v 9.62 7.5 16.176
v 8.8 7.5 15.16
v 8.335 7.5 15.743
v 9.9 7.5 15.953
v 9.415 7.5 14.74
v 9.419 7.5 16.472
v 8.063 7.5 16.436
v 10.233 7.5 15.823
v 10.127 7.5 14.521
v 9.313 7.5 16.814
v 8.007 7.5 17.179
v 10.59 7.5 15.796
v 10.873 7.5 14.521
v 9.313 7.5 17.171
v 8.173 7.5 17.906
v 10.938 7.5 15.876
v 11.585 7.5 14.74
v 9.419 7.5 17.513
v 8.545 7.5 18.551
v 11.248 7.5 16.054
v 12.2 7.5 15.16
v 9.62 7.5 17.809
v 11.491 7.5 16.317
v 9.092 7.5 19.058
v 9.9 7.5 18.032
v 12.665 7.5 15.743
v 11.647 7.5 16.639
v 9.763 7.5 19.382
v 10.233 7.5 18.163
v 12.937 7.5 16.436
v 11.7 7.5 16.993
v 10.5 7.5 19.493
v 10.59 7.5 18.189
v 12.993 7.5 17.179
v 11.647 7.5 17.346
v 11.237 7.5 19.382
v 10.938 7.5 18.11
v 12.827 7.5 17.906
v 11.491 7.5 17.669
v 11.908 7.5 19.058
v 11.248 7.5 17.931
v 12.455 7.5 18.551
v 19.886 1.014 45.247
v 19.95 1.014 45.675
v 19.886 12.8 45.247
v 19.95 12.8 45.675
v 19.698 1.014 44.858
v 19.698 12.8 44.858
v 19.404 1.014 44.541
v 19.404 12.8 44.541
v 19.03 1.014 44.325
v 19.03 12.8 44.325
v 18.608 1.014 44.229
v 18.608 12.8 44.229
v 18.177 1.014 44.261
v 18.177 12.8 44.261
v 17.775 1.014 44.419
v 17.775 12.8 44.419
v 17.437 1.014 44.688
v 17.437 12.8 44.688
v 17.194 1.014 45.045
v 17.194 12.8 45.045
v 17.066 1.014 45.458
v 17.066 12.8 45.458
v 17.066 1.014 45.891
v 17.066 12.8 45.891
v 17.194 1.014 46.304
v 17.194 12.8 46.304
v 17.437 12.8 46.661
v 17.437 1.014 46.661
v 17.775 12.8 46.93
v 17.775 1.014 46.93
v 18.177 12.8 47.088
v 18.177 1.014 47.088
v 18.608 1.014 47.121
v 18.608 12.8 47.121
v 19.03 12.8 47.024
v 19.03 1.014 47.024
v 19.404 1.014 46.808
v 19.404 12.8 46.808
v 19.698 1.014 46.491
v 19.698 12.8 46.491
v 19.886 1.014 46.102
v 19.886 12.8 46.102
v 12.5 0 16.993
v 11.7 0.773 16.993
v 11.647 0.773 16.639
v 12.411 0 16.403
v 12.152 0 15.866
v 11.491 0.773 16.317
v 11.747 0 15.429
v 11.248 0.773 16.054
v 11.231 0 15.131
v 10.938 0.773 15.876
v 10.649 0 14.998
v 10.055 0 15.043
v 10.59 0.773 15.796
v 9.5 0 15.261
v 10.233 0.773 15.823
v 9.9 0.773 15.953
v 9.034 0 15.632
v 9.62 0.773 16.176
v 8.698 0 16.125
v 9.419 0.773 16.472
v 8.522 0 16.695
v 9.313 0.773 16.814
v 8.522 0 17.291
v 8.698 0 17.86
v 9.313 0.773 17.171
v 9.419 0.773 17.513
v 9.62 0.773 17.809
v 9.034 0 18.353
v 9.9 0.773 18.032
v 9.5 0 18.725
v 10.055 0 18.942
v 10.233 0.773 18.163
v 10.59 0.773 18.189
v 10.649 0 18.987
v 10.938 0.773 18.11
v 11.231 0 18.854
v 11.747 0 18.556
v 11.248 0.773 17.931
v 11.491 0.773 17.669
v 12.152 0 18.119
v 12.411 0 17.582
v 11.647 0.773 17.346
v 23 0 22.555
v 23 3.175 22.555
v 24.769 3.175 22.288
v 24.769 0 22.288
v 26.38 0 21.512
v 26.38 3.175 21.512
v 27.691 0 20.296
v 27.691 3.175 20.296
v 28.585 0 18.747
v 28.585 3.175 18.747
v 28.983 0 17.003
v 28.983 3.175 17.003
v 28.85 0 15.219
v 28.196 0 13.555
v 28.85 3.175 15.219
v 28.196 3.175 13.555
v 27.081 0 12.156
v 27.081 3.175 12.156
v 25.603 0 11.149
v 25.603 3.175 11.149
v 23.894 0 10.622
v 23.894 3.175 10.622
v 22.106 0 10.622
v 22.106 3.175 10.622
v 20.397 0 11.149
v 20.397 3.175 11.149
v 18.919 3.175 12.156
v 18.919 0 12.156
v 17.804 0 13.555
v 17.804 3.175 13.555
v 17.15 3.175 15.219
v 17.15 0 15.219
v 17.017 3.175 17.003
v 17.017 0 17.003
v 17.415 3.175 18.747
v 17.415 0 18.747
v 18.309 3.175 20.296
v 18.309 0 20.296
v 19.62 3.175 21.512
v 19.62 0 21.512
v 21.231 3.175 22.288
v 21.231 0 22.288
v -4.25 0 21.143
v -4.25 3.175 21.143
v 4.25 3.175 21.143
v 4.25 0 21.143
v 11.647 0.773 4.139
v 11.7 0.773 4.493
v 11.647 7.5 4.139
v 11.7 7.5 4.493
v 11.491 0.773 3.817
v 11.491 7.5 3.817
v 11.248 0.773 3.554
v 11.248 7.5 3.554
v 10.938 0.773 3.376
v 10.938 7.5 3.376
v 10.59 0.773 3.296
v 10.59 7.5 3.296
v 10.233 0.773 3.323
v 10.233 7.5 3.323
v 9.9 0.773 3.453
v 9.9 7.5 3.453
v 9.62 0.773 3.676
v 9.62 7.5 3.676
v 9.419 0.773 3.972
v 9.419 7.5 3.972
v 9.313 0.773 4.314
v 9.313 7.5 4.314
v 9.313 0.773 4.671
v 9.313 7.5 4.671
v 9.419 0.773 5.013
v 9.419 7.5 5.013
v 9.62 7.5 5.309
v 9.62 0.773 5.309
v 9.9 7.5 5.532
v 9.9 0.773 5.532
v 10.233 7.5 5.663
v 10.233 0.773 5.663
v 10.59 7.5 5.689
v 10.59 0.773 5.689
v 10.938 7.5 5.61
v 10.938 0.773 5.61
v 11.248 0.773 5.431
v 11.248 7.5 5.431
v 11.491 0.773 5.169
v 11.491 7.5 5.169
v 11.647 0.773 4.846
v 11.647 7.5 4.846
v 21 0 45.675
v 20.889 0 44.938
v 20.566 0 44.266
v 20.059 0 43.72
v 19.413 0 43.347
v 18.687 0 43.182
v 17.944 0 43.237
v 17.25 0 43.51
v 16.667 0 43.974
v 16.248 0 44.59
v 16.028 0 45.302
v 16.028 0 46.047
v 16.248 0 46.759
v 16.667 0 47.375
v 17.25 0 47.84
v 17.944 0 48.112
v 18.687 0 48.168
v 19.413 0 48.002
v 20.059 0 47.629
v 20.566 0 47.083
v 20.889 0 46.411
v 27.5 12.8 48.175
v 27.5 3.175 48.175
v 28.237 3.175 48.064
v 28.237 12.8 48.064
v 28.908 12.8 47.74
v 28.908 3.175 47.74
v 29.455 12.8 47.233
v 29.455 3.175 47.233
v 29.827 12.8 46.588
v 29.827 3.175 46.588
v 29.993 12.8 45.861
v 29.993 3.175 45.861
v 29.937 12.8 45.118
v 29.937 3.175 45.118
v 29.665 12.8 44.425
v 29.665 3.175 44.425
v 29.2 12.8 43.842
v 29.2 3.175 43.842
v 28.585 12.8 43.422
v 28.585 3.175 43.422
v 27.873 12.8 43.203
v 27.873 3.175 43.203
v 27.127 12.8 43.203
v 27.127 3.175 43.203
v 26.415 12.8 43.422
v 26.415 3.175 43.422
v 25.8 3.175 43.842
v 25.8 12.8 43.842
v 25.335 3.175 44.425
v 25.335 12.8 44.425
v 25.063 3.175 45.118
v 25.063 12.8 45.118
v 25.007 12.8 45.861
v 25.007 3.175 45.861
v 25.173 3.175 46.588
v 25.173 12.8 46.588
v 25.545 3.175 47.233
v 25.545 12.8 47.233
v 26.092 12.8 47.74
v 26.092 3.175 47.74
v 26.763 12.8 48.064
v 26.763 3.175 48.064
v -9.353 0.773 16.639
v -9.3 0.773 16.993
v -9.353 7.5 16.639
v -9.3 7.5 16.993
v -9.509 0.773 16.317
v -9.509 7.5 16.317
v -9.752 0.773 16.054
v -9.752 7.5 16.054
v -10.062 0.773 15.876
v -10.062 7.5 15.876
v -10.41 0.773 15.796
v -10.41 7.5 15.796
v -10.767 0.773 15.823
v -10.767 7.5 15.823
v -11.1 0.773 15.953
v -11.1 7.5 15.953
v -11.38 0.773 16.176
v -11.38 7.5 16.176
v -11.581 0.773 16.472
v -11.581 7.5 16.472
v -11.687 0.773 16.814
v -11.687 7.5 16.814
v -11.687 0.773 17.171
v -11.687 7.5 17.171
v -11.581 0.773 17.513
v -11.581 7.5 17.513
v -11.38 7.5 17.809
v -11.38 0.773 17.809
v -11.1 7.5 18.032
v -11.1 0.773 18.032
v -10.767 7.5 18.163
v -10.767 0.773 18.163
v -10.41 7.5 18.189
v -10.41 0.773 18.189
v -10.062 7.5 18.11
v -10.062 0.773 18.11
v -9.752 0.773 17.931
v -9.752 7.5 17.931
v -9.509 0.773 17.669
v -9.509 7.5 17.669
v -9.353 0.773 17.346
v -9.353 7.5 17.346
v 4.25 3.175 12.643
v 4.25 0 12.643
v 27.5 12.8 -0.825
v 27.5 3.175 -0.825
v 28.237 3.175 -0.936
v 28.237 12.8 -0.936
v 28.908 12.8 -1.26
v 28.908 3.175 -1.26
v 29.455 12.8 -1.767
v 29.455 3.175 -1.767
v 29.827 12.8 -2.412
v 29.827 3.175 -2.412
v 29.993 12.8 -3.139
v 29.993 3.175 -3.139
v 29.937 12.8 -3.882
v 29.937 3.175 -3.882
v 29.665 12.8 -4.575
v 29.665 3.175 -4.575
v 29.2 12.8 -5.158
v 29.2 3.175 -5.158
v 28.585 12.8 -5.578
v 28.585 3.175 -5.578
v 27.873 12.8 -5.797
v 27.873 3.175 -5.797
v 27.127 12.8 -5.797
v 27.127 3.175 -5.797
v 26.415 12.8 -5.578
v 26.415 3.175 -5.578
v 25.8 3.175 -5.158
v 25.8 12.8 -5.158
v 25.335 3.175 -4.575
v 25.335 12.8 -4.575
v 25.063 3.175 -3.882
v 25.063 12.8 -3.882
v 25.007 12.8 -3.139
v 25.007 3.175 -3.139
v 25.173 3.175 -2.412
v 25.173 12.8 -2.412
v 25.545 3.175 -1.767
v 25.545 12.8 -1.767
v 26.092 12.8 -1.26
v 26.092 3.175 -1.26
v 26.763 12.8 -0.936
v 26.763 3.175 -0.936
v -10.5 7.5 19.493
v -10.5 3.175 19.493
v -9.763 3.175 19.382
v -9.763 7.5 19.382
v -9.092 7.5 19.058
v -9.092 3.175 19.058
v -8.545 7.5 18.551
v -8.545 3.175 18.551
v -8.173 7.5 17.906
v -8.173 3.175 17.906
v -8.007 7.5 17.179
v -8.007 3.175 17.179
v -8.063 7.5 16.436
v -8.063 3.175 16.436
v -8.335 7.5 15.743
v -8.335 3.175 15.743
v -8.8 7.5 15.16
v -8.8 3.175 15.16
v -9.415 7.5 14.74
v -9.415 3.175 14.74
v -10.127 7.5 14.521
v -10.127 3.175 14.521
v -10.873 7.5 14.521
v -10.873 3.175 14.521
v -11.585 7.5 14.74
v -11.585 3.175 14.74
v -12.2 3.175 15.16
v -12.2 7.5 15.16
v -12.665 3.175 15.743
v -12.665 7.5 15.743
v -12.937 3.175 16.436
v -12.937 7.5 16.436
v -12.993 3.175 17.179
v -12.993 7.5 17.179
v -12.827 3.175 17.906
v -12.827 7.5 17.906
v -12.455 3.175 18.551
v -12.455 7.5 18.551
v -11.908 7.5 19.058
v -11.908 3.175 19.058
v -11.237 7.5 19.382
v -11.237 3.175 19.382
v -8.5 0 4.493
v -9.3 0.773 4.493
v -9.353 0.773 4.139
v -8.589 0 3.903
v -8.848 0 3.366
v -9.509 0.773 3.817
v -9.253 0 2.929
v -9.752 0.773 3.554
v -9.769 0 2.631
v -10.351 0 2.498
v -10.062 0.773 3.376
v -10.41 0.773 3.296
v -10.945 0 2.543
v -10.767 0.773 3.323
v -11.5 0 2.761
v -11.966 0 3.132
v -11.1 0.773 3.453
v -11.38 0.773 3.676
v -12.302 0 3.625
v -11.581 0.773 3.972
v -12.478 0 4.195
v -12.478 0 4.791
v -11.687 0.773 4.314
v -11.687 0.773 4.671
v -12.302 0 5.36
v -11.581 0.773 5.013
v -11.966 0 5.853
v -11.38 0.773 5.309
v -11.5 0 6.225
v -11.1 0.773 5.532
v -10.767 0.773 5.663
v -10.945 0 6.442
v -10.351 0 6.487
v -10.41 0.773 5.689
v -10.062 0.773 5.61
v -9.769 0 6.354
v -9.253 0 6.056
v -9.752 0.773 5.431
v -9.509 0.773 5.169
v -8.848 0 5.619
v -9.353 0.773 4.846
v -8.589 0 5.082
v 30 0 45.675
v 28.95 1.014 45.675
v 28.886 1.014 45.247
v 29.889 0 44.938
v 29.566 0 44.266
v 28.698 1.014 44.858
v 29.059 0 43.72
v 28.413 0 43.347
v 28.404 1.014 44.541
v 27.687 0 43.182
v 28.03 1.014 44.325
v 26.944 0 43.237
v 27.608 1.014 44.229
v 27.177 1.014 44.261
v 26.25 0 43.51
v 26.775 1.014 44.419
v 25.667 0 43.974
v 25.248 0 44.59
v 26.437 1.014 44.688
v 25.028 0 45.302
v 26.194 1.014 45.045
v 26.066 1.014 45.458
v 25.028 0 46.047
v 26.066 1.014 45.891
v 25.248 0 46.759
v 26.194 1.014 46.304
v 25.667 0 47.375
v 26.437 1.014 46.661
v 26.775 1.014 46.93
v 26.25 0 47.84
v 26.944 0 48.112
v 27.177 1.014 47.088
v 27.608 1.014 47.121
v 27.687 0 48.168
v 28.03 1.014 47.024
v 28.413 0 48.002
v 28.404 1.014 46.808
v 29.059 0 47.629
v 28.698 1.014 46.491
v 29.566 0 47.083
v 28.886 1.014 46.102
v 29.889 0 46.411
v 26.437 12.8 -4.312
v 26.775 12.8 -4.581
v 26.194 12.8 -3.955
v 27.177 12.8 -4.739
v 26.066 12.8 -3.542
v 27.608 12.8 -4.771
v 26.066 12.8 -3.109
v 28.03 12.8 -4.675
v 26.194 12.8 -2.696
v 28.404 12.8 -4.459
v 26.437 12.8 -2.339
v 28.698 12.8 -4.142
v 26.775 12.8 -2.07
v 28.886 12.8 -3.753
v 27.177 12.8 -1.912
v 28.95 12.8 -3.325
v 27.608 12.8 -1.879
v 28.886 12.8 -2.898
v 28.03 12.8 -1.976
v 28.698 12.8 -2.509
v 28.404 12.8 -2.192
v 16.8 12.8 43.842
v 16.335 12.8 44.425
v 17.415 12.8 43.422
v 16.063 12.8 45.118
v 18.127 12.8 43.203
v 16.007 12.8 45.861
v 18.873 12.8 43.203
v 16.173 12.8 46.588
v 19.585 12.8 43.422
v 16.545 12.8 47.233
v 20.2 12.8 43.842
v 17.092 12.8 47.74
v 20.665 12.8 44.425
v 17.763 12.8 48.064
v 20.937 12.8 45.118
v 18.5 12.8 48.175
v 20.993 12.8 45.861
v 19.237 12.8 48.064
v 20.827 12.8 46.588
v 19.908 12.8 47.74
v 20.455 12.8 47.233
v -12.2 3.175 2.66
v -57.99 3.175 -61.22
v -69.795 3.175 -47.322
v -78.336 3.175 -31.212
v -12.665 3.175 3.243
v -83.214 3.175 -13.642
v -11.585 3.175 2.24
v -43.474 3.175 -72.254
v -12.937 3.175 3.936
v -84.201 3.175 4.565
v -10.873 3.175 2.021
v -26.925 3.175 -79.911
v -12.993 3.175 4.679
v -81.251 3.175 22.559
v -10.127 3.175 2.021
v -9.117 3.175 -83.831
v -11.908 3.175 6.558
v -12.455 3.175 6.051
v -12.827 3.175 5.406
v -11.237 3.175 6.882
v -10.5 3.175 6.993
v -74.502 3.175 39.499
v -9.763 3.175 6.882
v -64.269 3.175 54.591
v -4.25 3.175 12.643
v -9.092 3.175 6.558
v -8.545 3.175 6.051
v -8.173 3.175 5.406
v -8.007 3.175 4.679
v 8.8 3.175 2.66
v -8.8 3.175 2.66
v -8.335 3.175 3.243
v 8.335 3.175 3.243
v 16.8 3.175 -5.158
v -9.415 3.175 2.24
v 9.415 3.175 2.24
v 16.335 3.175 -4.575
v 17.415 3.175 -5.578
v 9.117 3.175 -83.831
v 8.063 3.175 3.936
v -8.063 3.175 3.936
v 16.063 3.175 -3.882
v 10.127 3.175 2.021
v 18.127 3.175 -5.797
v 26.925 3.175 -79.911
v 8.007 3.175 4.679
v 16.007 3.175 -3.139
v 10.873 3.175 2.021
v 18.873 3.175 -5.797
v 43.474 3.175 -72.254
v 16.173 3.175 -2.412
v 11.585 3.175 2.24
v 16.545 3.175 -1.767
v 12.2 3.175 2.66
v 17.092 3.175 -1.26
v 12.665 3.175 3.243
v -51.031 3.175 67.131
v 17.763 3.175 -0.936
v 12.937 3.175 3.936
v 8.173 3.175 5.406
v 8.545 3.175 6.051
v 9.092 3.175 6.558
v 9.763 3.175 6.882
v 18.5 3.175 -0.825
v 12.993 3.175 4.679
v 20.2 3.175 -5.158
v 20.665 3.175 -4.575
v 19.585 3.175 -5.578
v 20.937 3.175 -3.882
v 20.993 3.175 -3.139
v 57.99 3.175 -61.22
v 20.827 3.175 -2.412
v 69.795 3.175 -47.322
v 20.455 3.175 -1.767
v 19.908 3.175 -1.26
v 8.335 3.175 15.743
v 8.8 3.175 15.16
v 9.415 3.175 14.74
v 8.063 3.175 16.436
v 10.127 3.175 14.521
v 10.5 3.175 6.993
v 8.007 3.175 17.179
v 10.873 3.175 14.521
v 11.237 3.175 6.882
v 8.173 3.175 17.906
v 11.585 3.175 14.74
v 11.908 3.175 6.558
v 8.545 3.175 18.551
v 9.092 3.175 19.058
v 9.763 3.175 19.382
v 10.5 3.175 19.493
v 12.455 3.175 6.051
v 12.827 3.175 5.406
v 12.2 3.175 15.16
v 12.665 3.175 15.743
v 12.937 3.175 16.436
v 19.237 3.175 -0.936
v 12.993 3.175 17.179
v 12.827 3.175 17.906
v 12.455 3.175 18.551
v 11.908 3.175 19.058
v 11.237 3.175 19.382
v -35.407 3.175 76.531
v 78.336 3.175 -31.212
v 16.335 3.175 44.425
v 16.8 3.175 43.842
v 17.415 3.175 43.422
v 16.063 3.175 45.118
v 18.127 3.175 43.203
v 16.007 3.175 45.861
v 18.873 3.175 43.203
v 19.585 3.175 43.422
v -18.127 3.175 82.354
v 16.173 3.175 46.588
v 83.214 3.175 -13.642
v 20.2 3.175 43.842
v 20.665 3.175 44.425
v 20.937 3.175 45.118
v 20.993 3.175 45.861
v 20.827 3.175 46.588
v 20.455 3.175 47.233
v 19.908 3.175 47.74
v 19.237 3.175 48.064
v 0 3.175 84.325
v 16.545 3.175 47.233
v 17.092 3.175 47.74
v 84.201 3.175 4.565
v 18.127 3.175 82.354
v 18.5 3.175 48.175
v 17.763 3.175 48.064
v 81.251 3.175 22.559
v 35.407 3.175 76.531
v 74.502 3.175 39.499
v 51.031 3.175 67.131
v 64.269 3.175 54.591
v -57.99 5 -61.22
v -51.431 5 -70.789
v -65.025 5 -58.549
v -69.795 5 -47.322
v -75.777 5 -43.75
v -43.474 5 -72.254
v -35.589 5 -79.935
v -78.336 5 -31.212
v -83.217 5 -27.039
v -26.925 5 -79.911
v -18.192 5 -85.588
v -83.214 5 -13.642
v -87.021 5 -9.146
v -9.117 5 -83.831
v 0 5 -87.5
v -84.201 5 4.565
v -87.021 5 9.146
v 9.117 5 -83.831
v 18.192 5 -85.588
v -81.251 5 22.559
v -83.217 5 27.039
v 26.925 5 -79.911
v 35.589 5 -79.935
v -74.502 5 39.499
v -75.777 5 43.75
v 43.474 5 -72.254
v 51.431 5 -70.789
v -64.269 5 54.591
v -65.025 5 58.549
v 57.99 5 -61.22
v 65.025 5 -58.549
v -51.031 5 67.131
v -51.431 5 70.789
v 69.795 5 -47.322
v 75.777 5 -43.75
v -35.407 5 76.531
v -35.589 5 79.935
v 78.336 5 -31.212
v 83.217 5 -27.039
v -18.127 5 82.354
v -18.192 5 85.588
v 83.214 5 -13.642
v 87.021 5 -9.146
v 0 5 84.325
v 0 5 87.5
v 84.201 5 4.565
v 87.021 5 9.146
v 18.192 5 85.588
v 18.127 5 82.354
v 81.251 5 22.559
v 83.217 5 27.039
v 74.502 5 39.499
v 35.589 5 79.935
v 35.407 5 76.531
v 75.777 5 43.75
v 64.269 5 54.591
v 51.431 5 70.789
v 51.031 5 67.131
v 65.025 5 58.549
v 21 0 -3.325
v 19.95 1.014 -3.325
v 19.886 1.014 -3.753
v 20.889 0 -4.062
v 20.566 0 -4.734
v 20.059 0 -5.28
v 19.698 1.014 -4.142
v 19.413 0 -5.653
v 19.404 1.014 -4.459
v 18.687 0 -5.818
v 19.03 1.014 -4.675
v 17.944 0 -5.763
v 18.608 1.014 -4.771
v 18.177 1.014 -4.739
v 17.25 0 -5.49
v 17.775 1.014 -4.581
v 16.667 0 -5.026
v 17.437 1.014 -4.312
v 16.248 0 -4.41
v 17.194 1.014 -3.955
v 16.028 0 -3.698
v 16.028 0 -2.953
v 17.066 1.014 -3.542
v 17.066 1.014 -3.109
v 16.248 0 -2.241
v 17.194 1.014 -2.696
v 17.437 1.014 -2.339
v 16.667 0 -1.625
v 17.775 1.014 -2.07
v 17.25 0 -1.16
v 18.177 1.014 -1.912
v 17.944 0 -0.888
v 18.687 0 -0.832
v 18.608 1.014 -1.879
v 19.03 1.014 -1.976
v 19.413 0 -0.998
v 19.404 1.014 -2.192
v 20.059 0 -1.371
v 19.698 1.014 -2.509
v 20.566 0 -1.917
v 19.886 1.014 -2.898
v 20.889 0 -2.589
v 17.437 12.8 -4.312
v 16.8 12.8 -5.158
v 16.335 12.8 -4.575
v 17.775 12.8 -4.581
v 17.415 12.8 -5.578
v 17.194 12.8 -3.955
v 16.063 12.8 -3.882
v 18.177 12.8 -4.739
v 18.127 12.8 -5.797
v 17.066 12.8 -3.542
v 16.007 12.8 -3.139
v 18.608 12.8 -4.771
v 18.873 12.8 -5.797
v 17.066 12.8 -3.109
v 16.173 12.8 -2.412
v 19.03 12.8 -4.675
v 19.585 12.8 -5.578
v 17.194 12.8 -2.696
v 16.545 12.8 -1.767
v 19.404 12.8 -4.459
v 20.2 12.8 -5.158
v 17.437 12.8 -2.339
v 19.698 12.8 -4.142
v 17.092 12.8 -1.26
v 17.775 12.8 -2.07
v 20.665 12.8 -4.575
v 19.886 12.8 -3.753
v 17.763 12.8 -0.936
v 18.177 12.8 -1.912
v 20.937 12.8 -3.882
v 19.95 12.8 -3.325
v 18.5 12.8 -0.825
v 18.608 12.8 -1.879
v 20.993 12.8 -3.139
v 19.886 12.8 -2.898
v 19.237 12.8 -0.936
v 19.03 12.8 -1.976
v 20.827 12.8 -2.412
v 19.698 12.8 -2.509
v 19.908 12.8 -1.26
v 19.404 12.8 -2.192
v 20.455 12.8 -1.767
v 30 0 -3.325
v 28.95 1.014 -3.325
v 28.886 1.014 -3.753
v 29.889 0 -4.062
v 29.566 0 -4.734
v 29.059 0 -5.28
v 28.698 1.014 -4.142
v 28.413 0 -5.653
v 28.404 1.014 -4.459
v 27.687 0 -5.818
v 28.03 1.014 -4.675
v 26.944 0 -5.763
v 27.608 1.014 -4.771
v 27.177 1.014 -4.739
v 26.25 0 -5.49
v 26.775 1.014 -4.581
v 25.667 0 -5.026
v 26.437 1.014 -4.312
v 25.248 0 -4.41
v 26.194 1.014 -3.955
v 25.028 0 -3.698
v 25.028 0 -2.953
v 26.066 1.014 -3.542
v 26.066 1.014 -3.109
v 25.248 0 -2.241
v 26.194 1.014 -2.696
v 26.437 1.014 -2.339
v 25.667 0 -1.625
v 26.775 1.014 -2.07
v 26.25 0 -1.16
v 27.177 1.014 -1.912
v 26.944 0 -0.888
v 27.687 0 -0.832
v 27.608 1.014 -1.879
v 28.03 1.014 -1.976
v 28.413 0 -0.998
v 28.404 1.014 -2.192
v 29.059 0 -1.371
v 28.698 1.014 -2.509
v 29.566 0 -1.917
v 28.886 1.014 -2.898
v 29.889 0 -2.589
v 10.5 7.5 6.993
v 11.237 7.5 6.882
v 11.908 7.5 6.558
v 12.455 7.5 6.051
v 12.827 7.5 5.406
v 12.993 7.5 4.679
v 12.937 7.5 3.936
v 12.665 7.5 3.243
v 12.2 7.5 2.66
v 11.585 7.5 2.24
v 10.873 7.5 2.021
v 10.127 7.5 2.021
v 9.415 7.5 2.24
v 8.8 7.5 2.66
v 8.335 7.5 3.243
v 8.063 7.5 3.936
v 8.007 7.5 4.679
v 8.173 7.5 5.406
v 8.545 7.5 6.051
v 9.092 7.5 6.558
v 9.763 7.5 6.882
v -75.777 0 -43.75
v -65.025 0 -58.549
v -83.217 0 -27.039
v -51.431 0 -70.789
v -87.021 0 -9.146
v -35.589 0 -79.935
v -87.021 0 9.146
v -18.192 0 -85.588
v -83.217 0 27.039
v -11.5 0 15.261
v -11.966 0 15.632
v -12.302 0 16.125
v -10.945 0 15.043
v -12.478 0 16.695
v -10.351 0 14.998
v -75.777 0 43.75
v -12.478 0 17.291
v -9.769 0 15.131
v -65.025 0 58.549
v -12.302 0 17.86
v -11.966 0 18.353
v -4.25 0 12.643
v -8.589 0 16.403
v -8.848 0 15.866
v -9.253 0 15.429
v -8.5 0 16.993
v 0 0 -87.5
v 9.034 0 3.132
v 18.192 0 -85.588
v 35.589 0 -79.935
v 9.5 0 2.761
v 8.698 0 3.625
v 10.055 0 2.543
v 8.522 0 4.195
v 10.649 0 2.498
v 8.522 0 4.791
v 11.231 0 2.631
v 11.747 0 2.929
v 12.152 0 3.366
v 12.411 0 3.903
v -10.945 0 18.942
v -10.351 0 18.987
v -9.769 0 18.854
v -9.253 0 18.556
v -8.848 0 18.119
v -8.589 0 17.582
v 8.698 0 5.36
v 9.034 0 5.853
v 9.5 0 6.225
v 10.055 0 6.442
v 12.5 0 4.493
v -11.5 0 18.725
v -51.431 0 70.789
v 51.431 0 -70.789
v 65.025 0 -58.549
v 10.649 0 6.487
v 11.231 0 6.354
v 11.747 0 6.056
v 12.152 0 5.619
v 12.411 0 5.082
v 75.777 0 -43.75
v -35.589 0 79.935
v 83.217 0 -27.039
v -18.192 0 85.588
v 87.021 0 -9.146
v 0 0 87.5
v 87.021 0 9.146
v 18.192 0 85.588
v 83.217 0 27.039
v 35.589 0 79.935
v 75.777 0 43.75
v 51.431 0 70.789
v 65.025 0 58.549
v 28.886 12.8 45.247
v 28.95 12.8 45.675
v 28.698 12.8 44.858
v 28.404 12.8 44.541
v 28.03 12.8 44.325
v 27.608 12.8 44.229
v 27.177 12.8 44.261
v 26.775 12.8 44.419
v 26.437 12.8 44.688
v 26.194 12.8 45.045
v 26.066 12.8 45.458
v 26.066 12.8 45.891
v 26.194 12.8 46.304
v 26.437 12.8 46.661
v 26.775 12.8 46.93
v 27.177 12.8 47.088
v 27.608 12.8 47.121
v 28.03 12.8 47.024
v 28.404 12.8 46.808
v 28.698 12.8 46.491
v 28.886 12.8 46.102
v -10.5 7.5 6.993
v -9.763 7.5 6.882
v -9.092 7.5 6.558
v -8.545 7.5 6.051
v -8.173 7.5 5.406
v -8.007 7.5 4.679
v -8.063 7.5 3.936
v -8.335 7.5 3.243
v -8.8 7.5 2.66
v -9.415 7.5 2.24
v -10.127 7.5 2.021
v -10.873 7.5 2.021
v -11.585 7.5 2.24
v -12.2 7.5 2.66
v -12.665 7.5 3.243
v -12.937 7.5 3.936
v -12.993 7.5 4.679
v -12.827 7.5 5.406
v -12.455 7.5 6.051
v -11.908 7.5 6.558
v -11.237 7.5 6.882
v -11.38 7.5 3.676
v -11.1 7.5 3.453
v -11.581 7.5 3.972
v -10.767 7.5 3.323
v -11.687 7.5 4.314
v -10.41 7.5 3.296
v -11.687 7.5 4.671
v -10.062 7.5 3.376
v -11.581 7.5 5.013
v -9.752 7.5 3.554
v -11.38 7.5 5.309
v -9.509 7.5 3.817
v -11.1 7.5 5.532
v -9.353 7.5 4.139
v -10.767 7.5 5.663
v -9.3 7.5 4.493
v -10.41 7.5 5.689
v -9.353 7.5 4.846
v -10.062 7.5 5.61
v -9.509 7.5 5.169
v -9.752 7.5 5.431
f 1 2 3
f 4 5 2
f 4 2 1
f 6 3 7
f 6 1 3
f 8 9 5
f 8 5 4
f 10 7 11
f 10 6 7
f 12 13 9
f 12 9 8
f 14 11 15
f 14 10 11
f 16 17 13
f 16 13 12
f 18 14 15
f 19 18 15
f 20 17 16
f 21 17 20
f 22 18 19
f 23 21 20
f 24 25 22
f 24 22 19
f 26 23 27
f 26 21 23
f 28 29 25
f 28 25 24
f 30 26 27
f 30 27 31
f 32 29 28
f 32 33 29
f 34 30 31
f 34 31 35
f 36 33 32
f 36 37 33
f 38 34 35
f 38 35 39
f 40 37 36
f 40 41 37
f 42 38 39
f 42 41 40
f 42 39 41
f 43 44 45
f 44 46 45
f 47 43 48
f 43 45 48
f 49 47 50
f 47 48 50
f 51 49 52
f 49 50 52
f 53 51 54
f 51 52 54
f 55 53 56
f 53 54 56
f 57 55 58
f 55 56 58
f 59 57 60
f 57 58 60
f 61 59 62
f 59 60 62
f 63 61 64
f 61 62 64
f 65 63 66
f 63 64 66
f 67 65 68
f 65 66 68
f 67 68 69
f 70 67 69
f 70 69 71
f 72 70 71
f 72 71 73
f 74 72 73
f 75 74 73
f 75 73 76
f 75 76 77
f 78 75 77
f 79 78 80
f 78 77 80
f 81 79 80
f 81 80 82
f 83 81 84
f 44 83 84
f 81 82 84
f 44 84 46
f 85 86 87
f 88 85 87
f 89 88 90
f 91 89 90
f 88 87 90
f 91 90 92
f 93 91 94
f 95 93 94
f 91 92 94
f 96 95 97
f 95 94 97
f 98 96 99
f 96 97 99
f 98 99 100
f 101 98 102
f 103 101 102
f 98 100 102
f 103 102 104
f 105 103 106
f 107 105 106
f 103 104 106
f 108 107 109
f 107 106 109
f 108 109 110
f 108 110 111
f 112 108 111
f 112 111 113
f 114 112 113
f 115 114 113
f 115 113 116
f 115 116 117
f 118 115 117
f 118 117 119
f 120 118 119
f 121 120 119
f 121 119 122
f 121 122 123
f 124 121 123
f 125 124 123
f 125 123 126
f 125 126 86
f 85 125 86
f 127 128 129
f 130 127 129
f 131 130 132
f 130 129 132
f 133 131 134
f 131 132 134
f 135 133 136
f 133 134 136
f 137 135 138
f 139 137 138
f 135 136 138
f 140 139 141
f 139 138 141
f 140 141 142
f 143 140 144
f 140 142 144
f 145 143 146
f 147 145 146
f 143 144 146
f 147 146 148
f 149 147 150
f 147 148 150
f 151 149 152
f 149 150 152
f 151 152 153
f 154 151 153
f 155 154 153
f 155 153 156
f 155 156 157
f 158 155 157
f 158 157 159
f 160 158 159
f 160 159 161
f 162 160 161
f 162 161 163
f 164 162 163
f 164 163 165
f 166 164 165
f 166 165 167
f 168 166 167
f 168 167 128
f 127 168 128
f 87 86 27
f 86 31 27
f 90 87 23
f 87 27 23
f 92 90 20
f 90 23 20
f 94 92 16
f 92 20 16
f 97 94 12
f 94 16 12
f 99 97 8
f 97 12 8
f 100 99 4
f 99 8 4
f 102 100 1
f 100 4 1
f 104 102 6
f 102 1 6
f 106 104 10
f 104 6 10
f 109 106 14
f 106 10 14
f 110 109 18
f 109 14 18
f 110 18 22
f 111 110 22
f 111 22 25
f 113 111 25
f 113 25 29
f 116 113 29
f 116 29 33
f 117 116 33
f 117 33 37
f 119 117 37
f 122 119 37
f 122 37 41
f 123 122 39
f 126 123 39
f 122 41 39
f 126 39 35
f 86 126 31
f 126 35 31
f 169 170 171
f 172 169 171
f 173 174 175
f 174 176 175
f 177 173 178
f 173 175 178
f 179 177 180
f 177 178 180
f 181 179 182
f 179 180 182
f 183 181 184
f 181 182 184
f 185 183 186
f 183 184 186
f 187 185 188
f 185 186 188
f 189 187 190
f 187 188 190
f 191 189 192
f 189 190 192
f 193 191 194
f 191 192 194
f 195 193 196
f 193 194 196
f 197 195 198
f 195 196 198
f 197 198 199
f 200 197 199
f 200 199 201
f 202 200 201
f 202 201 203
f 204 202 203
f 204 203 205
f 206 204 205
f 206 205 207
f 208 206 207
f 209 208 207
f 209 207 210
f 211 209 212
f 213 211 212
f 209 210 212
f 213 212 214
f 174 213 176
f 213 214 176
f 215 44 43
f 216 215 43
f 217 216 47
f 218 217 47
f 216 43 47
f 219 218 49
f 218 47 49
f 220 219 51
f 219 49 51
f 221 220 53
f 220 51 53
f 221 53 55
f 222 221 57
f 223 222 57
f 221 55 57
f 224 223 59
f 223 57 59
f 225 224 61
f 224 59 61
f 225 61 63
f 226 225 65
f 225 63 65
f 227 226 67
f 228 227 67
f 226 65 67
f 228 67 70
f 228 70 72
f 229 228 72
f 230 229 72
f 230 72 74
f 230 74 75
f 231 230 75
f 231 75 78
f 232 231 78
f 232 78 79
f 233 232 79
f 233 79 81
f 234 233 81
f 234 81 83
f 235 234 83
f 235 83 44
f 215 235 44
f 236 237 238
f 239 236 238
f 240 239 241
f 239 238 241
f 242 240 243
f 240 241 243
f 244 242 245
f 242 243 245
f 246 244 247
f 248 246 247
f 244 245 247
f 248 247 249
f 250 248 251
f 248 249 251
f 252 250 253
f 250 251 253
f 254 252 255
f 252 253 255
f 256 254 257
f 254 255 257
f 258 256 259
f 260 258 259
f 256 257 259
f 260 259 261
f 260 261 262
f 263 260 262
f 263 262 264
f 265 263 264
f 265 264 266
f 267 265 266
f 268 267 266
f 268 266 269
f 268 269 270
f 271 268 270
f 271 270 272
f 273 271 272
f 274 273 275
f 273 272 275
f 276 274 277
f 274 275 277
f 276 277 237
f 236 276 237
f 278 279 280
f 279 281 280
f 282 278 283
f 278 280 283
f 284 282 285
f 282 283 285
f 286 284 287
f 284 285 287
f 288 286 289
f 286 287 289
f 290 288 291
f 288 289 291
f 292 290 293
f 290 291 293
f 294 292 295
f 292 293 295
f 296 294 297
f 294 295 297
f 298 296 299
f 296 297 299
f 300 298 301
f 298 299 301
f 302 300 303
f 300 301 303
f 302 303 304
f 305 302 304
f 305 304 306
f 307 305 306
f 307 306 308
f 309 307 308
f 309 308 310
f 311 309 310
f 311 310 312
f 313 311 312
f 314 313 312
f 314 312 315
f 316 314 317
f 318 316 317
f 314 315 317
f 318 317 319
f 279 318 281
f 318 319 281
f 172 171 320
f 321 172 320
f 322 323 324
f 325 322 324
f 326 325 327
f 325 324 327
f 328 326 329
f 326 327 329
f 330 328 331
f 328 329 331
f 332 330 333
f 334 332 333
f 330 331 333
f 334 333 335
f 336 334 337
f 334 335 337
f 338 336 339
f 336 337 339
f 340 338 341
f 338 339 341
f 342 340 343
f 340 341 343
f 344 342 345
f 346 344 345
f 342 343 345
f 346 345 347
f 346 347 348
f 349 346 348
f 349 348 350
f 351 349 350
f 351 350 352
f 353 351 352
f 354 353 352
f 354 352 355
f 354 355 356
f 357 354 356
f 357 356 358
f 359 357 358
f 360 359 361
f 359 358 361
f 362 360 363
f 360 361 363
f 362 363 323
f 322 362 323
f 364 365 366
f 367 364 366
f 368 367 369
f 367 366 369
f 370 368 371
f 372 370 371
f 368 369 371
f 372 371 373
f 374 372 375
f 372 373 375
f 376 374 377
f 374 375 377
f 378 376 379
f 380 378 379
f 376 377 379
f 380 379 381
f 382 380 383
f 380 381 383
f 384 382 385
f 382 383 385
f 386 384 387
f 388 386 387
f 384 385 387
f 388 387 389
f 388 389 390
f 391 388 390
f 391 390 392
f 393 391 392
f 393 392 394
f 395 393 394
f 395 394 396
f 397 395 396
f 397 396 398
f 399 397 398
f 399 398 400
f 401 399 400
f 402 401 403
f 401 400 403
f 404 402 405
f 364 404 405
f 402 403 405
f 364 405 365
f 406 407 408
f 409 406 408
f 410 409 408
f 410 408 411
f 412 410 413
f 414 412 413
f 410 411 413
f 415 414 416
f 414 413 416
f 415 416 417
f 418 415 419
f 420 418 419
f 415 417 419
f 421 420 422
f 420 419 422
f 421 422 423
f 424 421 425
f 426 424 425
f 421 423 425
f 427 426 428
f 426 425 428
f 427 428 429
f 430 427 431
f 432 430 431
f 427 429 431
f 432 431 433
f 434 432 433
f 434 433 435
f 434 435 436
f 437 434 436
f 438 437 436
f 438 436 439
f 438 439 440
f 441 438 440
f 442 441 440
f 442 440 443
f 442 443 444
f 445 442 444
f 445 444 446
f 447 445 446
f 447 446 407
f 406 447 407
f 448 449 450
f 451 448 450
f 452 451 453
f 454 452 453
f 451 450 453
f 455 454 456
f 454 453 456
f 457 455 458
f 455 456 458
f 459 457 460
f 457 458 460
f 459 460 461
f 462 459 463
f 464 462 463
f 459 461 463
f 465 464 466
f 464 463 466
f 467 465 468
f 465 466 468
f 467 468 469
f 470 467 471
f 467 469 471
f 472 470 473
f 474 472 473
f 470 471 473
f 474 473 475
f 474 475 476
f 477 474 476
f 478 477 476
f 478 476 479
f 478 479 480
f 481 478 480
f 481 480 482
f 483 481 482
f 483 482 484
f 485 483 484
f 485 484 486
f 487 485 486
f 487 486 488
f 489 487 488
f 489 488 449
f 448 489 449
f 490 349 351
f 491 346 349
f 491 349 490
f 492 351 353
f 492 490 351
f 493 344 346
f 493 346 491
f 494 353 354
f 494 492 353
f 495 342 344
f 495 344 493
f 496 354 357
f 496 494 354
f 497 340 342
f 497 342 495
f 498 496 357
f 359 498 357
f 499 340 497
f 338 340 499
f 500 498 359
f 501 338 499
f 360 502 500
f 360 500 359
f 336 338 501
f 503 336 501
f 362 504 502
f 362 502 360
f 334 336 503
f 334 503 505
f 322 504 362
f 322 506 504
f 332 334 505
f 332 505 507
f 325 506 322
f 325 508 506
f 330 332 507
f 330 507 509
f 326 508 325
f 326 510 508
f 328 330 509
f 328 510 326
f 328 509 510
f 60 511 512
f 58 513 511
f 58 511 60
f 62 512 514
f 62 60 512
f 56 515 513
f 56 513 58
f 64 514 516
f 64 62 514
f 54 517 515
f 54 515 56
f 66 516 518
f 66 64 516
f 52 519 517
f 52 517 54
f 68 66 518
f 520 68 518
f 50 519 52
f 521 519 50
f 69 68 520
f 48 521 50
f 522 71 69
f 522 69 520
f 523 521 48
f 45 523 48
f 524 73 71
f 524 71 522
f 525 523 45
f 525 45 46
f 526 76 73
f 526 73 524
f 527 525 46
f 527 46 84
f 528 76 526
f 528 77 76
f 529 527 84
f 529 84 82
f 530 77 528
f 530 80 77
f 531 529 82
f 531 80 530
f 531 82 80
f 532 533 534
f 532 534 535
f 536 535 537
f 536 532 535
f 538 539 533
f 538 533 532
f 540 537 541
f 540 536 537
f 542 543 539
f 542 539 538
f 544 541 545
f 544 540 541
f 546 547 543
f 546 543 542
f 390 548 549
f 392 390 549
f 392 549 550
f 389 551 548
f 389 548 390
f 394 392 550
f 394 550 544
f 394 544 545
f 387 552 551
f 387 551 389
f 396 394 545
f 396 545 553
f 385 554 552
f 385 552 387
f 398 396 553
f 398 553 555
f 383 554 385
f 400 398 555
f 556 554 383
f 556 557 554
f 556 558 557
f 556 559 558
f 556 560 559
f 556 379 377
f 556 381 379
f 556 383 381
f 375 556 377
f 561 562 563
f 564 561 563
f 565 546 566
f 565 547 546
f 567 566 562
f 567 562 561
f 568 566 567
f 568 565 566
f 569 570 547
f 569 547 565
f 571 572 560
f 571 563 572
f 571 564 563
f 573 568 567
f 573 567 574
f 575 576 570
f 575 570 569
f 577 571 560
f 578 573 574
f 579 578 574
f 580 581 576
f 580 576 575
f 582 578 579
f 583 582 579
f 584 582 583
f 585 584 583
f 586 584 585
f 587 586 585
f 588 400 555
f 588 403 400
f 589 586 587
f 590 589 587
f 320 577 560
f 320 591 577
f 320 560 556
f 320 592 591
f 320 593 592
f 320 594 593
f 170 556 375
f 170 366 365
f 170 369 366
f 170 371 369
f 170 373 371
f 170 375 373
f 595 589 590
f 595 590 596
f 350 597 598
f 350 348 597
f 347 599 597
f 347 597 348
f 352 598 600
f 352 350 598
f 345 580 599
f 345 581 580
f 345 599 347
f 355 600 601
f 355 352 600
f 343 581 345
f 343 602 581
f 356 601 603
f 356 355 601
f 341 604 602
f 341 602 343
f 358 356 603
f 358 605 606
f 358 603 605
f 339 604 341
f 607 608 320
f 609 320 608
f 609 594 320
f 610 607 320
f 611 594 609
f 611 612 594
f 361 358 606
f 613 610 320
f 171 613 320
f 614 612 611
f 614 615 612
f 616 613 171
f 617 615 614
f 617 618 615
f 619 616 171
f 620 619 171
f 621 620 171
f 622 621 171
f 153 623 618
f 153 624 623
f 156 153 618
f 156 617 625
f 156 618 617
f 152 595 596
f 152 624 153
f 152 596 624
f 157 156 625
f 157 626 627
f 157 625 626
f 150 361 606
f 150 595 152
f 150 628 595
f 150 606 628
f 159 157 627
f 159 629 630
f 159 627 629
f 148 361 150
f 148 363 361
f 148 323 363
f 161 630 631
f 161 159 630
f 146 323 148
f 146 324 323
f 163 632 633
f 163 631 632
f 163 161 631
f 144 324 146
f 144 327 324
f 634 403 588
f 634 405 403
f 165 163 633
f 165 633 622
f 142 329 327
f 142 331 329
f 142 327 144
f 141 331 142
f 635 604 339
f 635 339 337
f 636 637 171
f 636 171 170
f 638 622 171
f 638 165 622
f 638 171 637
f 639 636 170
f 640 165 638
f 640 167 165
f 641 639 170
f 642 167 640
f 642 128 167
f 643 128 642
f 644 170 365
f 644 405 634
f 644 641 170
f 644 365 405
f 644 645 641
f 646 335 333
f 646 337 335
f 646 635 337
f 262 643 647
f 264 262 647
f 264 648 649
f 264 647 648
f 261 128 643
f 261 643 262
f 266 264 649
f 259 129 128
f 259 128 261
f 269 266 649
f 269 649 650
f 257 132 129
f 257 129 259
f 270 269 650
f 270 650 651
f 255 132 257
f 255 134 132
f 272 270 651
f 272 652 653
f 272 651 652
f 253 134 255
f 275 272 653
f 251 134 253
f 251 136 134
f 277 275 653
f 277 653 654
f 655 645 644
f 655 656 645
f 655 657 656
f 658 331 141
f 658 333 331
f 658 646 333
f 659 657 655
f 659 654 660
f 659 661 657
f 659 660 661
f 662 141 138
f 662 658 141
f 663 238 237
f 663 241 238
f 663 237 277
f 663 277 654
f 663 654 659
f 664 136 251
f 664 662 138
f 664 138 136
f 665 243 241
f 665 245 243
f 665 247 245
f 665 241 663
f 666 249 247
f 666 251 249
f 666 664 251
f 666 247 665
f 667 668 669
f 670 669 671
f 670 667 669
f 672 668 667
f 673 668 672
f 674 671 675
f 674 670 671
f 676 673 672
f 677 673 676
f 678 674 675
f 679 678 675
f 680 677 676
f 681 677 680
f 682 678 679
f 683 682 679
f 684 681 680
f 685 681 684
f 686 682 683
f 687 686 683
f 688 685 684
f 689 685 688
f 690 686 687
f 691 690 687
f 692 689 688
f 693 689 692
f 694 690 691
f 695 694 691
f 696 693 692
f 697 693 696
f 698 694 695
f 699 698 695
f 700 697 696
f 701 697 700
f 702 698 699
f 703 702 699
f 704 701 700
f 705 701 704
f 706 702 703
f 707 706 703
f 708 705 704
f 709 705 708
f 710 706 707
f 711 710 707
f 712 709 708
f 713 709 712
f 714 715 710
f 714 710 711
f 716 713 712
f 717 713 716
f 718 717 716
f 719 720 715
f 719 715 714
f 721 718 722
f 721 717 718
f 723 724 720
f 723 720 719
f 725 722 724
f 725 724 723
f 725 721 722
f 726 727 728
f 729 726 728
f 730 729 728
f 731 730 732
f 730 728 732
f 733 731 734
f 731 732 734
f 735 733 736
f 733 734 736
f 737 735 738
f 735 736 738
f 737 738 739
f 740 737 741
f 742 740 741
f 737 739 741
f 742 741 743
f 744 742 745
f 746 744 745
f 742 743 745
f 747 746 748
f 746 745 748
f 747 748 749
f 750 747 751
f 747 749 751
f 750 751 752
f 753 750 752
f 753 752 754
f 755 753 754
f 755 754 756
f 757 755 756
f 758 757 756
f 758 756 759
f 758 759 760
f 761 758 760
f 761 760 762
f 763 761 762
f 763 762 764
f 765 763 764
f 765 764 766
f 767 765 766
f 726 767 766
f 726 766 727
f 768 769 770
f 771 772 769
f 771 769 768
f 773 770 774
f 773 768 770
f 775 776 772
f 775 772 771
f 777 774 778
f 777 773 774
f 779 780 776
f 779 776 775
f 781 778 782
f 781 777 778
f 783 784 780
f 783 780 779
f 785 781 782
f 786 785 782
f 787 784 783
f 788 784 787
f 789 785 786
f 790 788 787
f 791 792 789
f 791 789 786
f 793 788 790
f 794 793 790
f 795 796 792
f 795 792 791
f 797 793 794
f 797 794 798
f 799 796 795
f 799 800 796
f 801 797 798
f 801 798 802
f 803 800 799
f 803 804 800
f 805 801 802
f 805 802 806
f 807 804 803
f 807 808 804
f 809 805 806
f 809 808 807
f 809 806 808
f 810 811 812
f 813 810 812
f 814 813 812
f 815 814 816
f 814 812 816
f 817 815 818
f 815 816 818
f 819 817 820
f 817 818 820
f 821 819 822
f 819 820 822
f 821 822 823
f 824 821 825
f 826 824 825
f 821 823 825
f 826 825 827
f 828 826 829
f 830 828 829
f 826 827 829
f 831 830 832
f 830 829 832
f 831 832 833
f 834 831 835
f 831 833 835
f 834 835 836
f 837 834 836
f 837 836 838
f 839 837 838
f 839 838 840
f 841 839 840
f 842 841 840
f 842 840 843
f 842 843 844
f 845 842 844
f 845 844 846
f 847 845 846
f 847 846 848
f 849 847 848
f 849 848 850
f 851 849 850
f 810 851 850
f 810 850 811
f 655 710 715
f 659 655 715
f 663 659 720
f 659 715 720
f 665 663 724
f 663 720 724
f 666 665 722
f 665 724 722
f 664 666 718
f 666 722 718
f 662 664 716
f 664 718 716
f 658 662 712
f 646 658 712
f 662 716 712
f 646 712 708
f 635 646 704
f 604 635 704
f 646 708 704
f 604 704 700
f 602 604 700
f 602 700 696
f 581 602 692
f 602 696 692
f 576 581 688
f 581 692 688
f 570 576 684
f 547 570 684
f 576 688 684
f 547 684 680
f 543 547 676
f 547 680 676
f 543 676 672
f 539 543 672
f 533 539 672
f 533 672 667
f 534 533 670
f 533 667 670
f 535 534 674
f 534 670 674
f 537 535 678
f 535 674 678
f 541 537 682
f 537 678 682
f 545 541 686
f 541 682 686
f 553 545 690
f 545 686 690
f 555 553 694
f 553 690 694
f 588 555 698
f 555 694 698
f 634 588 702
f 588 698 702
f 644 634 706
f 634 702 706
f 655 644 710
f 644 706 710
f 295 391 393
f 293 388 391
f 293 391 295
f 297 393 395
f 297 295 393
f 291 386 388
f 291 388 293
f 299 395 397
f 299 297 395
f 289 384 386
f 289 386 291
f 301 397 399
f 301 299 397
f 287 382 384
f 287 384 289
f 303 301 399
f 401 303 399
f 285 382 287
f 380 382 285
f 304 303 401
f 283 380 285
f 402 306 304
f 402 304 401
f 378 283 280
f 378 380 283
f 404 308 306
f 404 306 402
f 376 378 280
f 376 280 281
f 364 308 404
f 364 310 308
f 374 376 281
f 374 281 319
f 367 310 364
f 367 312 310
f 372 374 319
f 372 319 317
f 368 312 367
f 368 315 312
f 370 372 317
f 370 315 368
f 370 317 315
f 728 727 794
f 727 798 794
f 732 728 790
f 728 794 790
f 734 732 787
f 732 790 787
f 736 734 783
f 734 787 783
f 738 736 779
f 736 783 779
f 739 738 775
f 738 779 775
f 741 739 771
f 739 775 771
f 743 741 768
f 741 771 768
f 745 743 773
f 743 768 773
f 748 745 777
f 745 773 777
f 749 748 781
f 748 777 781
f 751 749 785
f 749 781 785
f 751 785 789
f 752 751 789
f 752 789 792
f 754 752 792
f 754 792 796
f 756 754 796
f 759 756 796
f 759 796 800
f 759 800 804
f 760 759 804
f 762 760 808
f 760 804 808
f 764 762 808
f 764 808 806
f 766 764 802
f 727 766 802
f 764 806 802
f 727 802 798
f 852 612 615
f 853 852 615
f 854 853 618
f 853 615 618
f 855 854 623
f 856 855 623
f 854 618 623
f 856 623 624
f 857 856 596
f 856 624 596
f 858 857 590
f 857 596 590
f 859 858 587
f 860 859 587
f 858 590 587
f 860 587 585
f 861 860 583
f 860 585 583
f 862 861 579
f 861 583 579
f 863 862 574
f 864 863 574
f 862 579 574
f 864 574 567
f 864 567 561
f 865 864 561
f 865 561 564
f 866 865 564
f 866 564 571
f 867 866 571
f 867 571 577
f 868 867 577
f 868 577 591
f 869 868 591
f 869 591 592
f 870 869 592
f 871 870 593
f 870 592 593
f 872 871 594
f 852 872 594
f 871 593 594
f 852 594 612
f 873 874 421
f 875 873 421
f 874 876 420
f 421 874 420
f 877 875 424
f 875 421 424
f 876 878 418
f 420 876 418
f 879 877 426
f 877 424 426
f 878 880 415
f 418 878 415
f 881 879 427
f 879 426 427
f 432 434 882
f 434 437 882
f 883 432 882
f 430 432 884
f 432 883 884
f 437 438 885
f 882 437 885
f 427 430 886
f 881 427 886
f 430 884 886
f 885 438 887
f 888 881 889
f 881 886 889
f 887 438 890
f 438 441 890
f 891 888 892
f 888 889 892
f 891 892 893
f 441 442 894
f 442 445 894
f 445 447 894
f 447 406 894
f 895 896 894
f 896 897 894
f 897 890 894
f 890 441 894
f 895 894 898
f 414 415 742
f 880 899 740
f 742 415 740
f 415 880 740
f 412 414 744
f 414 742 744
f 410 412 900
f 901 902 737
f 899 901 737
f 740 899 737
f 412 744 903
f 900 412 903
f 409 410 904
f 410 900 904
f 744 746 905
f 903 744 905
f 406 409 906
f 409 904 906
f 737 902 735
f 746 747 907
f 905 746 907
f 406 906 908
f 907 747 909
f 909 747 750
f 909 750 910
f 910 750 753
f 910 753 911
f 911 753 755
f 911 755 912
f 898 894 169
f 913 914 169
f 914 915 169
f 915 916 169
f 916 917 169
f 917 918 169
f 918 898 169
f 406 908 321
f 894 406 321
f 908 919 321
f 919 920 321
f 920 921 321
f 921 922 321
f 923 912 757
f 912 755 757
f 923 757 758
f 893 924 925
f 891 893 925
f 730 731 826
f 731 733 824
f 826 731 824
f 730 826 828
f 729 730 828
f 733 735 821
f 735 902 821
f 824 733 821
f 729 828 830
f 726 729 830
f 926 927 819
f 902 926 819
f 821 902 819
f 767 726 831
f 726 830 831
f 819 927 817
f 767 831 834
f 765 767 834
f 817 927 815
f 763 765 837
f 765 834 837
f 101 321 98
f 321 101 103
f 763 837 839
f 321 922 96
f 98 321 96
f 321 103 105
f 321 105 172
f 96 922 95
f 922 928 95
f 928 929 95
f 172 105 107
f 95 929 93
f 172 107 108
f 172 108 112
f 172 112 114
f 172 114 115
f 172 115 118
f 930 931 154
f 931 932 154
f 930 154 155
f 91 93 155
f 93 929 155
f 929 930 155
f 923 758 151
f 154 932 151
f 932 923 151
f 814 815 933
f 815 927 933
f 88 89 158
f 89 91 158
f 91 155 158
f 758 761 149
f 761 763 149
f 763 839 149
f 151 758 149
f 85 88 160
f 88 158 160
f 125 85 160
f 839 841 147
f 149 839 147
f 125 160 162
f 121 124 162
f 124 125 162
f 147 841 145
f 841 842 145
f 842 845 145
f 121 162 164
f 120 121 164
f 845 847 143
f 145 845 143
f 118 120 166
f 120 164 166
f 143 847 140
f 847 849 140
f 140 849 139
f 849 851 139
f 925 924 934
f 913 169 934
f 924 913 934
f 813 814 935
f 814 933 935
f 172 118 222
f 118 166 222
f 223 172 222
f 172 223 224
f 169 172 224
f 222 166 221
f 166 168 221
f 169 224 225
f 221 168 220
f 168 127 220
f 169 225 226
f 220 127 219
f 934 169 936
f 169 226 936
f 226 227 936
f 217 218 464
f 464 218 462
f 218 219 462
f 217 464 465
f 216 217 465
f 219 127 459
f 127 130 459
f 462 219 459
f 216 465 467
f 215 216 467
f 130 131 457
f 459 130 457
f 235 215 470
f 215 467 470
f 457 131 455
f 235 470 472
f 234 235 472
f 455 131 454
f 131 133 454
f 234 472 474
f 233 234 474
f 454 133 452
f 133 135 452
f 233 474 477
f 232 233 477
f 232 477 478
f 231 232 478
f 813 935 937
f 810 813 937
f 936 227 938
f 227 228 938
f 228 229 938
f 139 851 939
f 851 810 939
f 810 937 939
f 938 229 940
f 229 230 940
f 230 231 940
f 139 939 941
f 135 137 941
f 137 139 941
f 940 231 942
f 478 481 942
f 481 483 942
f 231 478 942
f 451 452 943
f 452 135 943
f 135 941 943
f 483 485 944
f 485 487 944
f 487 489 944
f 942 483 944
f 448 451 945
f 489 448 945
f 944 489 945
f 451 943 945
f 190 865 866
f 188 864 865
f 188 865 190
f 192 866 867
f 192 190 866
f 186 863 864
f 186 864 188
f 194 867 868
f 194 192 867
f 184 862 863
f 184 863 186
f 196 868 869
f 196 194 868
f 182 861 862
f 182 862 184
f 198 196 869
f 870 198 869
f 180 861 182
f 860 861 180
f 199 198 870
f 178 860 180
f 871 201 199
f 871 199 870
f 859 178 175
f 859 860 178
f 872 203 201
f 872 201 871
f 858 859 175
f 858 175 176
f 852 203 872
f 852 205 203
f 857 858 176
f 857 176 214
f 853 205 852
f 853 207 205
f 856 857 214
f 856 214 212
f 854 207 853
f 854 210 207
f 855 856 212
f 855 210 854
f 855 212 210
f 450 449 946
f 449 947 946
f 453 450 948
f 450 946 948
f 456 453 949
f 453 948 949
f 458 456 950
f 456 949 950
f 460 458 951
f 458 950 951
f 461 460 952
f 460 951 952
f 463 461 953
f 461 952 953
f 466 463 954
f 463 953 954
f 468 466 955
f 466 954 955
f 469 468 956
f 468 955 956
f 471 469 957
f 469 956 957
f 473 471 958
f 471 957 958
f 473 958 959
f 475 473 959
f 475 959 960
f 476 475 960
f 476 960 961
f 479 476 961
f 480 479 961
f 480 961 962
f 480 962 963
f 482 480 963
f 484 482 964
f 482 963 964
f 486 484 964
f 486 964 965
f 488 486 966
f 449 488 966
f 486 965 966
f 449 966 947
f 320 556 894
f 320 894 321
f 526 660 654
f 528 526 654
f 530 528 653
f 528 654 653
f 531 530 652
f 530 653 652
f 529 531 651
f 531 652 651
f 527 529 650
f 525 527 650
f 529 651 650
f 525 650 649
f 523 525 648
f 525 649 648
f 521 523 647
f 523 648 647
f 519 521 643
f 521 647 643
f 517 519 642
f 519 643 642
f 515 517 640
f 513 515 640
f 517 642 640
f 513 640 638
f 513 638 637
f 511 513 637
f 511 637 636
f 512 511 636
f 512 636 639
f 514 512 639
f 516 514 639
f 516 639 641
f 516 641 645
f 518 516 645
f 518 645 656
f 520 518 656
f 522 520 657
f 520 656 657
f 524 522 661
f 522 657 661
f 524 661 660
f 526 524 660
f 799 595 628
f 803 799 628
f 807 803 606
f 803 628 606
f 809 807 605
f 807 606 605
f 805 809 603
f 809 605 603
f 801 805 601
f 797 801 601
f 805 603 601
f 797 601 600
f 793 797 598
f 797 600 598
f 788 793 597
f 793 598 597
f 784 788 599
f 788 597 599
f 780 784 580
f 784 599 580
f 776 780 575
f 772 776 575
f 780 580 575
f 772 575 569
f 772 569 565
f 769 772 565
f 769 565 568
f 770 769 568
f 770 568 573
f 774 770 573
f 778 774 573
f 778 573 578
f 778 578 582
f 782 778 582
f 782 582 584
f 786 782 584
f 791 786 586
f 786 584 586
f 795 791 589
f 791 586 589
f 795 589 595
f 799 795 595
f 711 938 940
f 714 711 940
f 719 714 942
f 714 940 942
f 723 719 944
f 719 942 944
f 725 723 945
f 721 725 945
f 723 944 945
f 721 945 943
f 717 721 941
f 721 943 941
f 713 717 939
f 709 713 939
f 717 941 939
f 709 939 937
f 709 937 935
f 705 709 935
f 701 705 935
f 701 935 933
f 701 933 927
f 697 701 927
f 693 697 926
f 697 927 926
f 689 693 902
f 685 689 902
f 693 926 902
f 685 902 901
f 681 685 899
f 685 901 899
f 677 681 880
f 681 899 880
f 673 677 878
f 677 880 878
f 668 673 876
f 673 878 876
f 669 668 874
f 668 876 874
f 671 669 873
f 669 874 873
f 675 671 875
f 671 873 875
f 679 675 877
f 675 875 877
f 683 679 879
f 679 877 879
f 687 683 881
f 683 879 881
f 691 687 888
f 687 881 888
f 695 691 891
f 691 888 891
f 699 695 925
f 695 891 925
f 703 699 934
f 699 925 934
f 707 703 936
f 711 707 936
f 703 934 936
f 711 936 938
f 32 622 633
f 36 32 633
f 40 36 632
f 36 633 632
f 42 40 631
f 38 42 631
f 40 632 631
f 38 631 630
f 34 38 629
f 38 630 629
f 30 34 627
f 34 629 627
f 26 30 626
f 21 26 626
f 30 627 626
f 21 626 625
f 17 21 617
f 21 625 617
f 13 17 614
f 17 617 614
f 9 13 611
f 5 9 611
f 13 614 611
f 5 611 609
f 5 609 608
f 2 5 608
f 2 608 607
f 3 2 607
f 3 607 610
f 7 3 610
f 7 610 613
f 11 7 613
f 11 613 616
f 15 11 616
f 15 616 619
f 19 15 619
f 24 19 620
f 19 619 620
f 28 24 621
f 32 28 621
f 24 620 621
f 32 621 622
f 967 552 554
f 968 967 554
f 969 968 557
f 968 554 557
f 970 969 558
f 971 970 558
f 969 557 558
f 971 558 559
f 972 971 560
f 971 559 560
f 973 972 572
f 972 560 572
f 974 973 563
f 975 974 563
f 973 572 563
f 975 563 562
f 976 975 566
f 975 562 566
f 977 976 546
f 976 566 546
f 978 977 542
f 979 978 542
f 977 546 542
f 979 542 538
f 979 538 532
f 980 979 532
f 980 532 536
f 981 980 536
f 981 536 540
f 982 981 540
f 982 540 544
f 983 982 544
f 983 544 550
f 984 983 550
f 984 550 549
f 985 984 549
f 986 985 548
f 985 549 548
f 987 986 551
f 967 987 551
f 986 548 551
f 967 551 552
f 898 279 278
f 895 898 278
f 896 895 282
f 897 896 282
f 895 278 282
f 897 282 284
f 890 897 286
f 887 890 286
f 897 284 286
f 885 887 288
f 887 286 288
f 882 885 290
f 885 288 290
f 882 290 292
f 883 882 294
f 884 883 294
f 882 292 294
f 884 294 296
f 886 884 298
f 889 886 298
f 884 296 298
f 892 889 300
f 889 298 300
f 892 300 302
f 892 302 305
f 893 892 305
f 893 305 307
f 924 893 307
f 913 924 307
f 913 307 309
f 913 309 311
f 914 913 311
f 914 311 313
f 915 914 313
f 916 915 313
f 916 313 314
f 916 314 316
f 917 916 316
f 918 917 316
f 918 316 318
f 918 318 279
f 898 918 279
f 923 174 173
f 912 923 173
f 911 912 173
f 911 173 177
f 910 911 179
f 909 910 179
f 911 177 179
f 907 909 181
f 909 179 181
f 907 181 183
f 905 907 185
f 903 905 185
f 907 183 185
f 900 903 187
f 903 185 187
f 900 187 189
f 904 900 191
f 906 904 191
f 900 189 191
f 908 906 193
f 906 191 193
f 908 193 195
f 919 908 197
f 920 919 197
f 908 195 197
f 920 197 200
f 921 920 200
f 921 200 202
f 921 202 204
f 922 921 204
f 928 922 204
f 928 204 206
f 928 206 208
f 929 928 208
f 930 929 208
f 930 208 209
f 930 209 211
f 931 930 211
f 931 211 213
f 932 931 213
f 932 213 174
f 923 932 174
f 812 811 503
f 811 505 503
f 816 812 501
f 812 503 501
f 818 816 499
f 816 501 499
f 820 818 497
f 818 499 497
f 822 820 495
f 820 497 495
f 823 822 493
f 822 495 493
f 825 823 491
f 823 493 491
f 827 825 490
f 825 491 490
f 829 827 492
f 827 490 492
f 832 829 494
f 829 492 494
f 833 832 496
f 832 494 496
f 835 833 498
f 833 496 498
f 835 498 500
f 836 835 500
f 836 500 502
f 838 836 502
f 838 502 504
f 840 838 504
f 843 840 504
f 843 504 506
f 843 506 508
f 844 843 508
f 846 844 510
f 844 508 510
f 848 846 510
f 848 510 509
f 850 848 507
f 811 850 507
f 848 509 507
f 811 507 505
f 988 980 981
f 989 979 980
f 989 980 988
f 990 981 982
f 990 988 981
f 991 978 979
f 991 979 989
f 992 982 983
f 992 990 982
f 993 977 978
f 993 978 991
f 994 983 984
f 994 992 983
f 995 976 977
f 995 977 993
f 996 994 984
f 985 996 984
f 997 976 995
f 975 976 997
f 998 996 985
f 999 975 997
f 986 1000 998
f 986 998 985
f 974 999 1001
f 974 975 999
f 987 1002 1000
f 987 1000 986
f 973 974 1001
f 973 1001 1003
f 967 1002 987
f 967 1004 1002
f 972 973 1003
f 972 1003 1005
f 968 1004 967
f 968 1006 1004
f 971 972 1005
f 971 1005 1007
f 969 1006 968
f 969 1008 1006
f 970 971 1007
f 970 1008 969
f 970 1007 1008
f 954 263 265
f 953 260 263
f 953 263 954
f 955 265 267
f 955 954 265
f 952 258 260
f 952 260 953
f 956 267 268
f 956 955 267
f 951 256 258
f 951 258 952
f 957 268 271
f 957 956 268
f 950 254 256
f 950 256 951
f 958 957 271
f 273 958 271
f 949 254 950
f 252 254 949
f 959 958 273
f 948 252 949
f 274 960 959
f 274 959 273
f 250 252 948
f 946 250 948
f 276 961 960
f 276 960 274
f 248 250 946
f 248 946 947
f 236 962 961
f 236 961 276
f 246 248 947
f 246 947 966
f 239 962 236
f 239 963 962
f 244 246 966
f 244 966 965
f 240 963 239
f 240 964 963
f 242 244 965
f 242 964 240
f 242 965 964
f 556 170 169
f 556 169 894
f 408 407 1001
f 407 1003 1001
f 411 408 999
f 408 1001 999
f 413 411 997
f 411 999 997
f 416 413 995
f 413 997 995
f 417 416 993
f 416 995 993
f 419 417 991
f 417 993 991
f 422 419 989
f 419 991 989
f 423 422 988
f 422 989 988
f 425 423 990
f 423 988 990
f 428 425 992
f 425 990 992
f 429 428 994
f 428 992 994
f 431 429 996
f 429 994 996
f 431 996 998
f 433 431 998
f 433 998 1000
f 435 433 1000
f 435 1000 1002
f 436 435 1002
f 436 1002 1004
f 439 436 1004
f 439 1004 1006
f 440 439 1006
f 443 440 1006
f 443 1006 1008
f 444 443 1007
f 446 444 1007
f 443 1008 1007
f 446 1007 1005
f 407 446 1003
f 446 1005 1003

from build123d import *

# Parameters (mm, degrees)
SKETCH1_R                                            = 87.5
BOSS_EXTRUDE1_DEPTH                                  = 5
SKETCH2_R                                            = 84.325
CUT_EXTRUDE1_DEPTH                                   = 1.825
SKETCH3_W                                            = 8.5
SKETCH3_H                                            = 8.5
SKETCH3_R                                            = 6
CUT_EXTRUDE2_DEPTH                                   = 124.784411882
SKETCH4_R                                            = 2.5
BOSS_EXTRUDE2_DEPTH                                  = 4.325
SKETCH4_2_R                                          = 2.5
BOSS_EXTRUDE3_DEPTH                                  = 9.625
CSK_FOR_M2_5_CROSS_COUNTERSUNK_HEAD_SCRE_D           = 2.9
CSK_FOR_M2_5_CROSS_COUNTERSUNK_HEAD_SCRE_CSINK_D     = 5
CSK_FOR_M2_5_CROSS_COUNTERSUNK_HEAD_SCRE_CSINK_ANGLE = 92
CSK_FOR_M2_CROSS_COUNTERSUNK_HEAD_SCREW1_D           = 2.4
CSK_FOR_M2_CROSS_COUNTERSUNK_HEAD_SCREW1_CSINK_D     = 4
CSK_FOR_M2_CROSS_COUNTERSUNK_HEAD_SCREW1_CSINK_ANGLE = 92


with BuildPart() as part:
    # Sketch1 → Boss-Extrude1 (new body)
    with BuildSketch(Plane(origin=(0, 0, 0), x_dir=(1, 0, 0), z_dir=(0, 1, 0))):
        Circle(SKETCH1_R)
    extrude(amount=BOSS_EXTRUDE1_DEPTH)

    # Sketch2 → Cut-Extrude1 (cut)
    with BuildSketch(Plane(origin=(0, 5, 0), x_dir=(1, 0, 0), z_dir=(0, 1, 0))):
        Circle(SKETCH2_R)
    extrude(amount=-CUT_EXTRUDE1_DEPTH, mode=Mode.SUBTRACT)

    # Sketch3 → Cut-Extrude2 (cut, through all)
    with BuildSketch(Plane(origin=(0, 3.175, 0), x_dir=(1, 0, 0), z_dir=(0, 1, 0))):
        with Locations((0, -16.8926)):
            Rectangle(SKETCH3_W, SKETCH3_H)
        with Locations((23, -16.5546)):
            Circle(SKETCH3_R)
    extrude(amount=-CUT_EXTRUDE2_DEPTH, mode=Mode.SUBTRACT)

    # Sketch4 → Boss-Extrude2 (add)
    with BuildSketch(Plane(origin=(0, 3.175, 0), x_dir=(1, 0, 0), z_dir=(0, 1, 0))):
        with Locations((10.5, -4.4926)):
            Circle(SKETCH4_R)
        with Locations((10.5, -16.9926)):
            Circle(SKETCH4_R)
        with Locations((-10.5, -16.9926)):
            Circle(SKETCH4_R)
        with Locations((-10.5, -4.4926)):
            Circle(SKETCH4_R)
    extrude(amount=BOSS_EXTRUDE2_DEPTH)

    # Sketch4<2> → Boss-Extrude3 (add)
    with BuildSketch(Plane(origin=(0, 3.175, 0), x_dir=(1, 0, 0), z_dir=(0, 1, 0))):
        with Locations((27.5, 3.3254)):
            Circle(SKETCH4_2_R)
        with Locations((27.5, -45.6746)):
            Circle(SKETCH4_2_R)
        with Locations((18.5, -45.6746)):
            Circle(SKETCH4_2_R)
        with Locations((18.5, 3.3254)):
            Circle(SKETCH4_2_R)
    extrude(amount=BOSS_EXTRUDE3_DEPTH)

    # CSK for M2.5 Cross Countersunk Head Screw1 (through all)
    with Locations(Plane(origin=(0, 0, 0), x_dir=(-1, 0, 0), z_dir=(0, -1, 0))):
        with Locations((-27.5, 3.3254), (-18.5, 3.3254), (-27.5, -45.6746), (-18.5, -45.6746)):
            CounterSinkHole(CSK_FOR_M2_5_CROSS_COUNTERSUNK_HEAD_SCRE_D / 2, CSK_FOR_M2_5_CROSS_COUNTERSUNK_HEAD_SCRE_CSINK_D / 2, counter_sink_angle=CSK_FOR_M2_5_CROSS_COUNTERSUNK_HEAD_SCRE_CSINK_ANGLE)

    # CSK for M2 Cross Countersunk Head Screw1 (through all)
    with Locations(Plane(origin=(0, 0, 0), x_dir=(-1, 0, 0), z_dir=(0, -1, 0))):
        with Locations((10.5, -4.4926), (-10.5, -4.4926), (-10.5, -16.9926), (10.5, -16.9926)):
            CounterSinkHole(CSK_FOR_M2_CROSS_COUNTERSUNK_HEAD_SCREW1_D / 2, CSK_FOR_M2_CROSS_COUNTERSUNK_HEAD_SCREW1_CSINK_D / 2, counter_sink_angle=CSK_FOR_M2_CROSS_COUNTERSUNK_HEAD_SCREW1_CSINK_ANGLE)


solid = part.part
